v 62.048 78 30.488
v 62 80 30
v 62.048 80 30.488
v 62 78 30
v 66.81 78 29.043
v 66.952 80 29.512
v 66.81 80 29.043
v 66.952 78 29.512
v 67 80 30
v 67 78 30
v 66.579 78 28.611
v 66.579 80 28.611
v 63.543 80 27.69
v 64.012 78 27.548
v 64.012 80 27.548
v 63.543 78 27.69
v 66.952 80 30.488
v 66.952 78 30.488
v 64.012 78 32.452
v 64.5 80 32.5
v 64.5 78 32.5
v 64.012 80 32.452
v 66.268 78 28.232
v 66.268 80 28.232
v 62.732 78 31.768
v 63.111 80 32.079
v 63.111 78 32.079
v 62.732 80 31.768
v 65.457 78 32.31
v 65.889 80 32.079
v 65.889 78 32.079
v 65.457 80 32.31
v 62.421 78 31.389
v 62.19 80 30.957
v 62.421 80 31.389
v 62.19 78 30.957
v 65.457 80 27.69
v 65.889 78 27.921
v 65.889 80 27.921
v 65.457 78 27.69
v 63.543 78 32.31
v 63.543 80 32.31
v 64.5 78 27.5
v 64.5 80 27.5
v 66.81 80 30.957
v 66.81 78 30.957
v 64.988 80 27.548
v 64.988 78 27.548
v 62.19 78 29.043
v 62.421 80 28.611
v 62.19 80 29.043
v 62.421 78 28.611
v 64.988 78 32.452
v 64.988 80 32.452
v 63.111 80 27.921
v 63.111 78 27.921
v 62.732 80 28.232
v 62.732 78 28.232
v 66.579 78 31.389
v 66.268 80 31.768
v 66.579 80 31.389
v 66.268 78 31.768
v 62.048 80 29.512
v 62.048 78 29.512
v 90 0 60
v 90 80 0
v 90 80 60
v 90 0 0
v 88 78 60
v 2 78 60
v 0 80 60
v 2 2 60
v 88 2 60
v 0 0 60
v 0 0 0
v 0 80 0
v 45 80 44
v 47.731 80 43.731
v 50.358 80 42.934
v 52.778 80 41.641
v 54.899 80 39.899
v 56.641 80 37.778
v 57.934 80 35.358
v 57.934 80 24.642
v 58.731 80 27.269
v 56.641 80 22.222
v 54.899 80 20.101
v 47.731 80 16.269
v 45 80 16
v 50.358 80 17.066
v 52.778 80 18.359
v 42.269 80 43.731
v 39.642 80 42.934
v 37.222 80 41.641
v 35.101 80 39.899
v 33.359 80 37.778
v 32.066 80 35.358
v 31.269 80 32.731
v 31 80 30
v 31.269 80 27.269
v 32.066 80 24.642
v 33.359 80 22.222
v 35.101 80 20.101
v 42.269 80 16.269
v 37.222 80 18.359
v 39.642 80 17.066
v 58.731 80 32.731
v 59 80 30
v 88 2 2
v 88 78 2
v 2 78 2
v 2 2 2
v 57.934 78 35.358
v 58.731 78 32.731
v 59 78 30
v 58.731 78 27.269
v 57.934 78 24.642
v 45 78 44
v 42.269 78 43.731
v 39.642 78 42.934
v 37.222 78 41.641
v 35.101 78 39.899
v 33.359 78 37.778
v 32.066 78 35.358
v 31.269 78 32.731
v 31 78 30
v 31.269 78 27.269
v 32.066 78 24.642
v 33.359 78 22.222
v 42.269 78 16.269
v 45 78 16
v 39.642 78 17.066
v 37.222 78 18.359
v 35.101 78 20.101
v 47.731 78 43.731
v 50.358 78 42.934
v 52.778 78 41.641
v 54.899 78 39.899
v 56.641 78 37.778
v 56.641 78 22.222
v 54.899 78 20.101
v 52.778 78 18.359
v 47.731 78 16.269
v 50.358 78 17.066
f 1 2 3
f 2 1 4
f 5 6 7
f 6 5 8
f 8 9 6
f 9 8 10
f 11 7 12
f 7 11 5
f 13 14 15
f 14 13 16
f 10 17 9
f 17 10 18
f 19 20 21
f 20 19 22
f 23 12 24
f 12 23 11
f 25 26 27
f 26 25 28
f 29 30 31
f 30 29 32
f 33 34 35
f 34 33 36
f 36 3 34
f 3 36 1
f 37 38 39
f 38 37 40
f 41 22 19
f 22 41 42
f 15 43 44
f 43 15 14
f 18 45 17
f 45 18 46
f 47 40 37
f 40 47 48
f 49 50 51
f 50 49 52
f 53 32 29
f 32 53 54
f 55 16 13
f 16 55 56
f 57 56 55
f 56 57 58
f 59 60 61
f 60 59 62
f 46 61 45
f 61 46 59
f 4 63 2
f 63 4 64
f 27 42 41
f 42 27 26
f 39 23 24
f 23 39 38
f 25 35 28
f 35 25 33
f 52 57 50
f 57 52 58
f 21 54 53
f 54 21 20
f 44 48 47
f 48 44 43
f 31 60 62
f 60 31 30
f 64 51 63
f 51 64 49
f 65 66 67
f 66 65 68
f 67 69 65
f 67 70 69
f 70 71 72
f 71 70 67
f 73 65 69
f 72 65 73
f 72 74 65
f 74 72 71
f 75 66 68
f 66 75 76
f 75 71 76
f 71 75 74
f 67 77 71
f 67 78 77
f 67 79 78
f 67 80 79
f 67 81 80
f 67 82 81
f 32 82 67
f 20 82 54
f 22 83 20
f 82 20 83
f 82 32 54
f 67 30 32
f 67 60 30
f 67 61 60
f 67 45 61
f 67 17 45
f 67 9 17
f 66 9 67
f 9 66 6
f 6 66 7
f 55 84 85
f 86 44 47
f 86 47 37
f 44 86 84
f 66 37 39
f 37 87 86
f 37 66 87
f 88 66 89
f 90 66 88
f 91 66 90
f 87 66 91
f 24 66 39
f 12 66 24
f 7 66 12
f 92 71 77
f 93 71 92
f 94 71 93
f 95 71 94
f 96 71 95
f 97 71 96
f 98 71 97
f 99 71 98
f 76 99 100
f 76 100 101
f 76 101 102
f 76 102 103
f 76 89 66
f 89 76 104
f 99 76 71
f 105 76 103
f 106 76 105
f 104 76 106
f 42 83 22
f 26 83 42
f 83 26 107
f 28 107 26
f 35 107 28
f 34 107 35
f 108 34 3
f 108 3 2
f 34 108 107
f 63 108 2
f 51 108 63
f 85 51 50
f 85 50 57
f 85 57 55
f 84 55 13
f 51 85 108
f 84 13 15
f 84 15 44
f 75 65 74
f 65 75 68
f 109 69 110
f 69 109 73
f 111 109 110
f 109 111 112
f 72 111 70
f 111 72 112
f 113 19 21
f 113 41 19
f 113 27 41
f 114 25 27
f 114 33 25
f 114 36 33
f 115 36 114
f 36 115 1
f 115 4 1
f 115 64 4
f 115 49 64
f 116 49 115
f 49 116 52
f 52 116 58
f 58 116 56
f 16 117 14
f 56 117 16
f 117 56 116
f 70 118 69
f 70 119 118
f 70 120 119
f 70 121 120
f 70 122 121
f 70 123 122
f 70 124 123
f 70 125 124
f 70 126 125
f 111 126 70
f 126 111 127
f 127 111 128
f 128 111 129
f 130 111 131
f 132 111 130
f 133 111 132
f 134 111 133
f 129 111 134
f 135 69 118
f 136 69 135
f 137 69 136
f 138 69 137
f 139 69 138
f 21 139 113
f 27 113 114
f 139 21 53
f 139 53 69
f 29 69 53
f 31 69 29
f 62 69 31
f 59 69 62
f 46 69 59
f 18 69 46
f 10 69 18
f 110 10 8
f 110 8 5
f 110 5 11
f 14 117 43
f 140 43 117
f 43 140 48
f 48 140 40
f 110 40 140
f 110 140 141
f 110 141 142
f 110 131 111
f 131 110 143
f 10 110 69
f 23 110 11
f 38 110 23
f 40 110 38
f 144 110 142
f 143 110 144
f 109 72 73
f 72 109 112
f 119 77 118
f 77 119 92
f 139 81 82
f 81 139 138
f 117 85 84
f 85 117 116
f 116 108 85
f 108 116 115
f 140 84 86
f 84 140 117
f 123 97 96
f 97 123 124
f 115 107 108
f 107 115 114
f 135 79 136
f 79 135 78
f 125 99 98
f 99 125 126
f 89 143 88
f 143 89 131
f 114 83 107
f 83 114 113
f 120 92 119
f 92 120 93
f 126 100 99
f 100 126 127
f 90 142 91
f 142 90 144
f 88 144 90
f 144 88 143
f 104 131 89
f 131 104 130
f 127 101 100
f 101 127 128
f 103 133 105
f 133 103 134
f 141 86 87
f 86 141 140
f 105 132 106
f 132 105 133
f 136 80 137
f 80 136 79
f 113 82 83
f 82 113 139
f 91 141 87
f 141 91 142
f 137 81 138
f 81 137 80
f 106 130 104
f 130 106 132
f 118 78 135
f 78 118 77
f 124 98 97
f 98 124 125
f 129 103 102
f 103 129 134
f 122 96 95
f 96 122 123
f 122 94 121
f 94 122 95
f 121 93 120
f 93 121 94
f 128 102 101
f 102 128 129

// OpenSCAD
$fn = 32;

// ----------------------------------------------------------------------
// Vent box: roundvent enclosure
// ----------------------------------------------------------------------

// --- parameters (mm) ---
box_l = 90;               // box length, X
box_w = 80;               // box width, Y
box_h = 60;               // box height, Z
wall_t = 2;               // shell wall thickness
vent_d = 28;              // central vent diameter
ring_d = 5;               // ring hole diameter
n_ring = 8;               // holes in the ring
ring_r = 19.5;            // ring radius

ring_step = 360 / n_ring;  // ring hole angular step

difference() {
  cube([box_l, box_w, box_h]);
  translate([wall_t, wall_t, wall_t])
    cube([box_l - 2 * wall_t, box_w - 2 * wall_t, box_h]);
  translate([box_l / 2, box_w - wall_t - 1, box_h / 2])
    rotate([-90, 0, 0]) cylinder(h = wall_t + 2, d = vent_d);
  for (i = [0 : n_ring - 1])
    translate([box_l / 2, box_w - wall_t - 1, box_h / 2])
      rotate([0, 0, i * ring_step])
        translate([ring_r, 0, 0]) rotate([-90, 0, 0])
          cylinder(h = wall_t + 2, d = ring_d);
}
